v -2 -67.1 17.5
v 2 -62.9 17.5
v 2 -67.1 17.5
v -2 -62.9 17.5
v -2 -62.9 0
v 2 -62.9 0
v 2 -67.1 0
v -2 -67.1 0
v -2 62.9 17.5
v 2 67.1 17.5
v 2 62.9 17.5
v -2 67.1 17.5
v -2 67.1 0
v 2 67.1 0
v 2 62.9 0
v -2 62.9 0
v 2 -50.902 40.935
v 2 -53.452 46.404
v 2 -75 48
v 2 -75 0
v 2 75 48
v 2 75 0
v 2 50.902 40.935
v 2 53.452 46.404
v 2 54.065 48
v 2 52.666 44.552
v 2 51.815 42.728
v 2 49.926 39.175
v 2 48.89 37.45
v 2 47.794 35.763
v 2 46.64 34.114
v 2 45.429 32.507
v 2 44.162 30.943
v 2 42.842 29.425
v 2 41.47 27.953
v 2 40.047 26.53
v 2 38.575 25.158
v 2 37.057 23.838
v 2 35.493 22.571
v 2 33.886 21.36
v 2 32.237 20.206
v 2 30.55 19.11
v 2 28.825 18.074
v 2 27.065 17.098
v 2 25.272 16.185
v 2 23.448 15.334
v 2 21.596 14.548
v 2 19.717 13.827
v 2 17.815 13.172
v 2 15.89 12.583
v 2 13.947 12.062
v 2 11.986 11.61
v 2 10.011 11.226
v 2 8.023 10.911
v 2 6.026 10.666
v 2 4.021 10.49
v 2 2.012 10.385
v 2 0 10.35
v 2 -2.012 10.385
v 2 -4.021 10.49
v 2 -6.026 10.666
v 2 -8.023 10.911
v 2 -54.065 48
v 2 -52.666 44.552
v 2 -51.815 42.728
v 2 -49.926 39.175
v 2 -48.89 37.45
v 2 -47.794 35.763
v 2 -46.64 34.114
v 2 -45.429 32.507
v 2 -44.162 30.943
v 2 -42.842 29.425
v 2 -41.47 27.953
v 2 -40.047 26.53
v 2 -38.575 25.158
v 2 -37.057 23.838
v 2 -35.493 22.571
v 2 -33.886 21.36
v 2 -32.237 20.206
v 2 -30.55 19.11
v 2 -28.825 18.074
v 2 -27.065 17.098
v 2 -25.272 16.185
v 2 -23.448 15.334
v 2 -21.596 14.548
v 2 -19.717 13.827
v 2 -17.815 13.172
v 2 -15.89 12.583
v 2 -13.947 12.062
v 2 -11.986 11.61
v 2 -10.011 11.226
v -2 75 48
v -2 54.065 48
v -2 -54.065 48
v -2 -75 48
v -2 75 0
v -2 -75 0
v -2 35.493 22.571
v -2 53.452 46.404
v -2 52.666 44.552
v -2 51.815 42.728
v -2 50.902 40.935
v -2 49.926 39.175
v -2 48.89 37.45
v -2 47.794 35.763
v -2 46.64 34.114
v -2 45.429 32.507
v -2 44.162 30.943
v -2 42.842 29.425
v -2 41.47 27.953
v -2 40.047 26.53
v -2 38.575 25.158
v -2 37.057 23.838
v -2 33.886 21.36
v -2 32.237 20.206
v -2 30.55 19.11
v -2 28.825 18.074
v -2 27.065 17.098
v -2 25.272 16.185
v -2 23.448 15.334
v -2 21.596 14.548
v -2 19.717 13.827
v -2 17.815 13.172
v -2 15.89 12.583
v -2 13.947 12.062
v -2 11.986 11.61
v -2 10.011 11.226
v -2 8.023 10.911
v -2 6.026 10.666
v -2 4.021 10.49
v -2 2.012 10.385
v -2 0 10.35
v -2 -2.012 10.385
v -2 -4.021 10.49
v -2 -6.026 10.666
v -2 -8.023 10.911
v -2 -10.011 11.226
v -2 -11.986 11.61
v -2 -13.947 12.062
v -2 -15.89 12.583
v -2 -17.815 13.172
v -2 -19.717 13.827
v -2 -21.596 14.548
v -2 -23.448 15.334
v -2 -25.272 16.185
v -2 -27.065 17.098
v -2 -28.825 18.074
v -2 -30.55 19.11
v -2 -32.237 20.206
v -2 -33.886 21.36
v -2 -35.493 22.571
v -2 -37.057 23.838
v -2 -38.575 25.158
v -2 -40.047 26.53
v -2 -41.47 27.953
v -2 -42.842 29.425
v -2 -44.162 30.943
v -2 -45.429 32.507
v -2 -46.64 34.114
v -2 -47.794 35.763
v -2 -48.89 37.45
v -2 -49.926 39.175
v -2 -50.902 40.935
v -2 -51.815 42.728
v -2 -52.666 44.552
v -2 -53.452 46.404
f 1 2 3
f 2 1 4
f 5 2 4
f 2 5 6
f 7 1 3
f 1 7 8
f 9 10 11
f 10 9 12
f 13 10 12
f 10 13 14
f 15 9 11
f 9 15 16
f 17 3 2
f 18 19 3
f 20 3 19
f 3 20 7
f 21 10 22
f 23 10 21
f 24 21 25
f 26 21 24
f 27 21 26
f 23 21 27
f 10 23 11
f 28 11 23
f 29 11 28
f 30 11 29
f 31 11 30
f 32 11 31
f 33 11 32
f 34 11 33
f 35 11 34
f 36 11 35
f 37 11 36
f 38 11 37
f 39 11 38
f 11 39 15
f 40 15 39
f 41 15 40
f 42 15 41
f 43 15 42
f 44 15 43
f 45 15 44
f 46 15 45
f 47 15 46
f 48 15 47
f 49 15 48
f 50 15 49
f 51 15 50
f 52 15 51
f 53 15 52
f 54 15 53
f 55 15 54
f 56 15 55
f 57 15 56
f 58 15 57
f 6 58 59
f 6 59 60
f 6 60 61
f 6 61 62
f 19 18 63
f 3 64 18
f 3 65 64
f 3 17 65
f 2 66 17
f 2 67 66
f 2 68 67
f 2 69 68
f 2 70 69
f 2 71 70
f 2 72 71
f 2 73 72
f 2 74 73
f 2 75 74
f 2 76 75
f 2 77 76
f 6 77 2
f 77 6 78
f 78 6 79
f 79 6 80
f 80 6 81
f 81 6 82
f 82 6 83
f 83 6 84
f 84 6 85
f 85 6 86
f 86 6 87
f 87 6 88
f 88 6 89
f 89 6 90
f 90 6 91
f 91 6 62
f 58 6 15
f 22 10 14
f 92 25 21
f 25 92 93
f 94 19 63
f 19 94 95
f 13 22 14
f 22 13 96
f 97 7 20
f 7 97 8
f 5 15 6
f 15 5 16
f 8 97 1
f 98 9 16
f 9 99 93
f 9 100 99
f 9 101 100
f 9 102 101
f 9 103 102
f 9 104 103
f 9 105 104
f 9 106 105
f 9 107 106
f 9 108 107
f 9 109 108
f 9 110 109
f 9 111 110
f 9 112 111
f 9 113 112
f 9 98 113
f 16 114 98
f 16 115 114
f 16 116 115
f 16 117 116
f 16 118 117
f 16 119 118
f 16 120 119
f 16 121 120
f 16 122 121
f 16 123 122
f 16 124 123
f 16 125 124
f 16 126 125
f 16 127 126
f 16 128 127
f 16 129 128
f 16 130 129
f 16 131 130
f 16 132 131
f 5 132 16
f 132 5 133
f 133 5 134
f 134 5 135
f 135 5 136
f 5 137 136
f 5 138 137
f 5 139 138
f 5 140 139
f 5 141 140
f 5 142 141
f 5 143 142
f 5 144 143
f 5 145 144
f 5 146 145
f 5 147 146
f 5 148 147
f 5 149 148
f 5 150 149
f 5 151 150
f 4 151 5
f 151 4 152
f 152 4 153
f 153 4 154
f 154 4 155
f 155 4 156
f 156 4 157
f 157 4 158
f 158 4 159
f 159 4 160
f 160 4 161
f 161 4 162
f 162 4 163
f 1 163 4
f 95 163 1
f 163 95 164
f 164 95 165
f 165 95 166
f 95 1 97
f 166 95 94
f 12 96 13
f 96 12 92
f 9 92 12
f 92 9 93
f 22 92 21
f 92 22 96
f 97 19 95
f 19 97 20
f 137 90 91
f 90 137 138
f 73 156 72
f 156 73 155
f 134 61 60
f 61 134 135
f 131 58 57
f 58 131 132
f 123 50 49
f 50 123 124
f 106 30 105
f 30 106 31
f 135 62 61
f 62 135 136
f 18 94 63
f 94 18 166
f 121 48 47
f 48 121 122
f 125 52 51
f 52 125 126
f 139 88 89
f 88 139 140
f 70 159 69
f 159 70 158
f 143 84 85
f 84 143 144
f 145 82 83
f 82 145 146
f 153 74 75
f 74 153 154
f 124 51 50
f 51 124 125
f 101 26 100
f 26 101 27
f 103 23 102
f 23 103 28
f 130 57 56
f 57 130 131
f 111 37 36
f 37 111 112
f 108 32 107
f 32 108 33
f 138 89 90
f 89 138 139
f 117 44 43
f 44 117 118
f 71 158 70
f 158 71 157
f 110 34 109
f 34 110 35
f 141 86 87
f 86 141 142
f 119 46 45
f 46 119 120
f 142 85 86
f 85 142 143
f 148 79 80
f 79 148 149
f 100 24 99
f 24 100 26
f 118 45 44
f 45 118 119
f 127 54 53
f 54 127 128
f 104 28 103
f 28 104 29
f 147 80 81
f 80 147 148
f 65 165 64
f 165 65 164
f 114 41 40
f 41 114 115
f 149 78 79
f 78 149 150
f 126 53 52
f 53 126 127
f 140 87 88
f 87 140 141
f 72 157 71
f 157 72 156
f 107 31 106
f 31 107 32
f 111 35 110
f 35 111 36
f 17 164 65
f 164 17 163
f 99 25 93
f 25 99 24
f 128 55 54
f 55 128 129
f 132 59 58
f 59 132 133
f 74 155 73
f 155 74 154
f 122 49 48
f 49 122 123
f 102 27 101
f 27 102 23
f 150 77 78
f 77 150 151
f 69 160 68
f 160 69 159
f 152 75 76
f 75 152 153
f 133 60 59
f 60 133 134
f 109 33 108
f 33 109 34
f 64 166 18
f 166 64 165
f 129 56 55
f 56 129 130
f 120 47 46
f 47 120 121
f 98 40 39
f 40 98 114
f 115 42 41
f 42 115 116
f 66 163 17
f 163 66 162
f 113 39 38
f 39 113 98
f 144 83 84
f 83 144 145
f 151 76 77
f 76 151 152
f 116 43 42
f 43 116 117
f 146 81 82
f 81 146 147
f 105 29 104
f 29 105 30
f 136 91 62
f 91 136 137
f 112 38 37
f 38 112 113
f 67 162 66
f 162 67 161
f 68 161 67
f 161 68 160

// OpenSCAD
// =====================================================================
// wte4_display_stand.scad - WTE4 耐圧容器 展示用 転がり止め台
//
// Blue Robotics WTE4 アクリルチューブ (OD 114.3, 200mm) をフランジ+エンド
// キャップ付きのまま横置きで展示するための台。円筒部だけを 2 枚の受け板で
// 受け、2 本の横桟と十字相欠き (cross-lap) で組む。ねじ・接着なし。
//
//   part="cradle"  受け板  ×2 (YZ 面、円弧受け)
//   part="rail"    横桟    ×2 (XZ 面、受け板をつなぐ)
//   part="asm"     組立状態 (プレビュー用。相欠きのクリアランス 0 で融合)
//   part="demo"    組立状態 + チューブ (PNG プレビュー専用。STL にしない)
//
// 座標系: X = チューブ軸、Y = 幅、Z = 上。原点 = 台の底面中心。
// 印刷向き: どちらの板も平置き (最も広い面を下)。サポート不要。
// 取合い: parts/child/exterior/cots/wte4_acrylic_tube (interfaces.json で固定)
// =====================================================================

/* [部品選択] */
part = "cradle";      // [cradle, rail, asm, demo]

/* [相手部品 (wte4_acrylic_tube)] */
tube_od   = 114.3;    // チューブ外径 (公称 114.3 ± 0.8)
tube_len  = 200;      // チューブ長 (BR-101052-200)
fit_clear = 0.5;      // 半径方向の余裕 (EVA/フェルトを貼るなら厚み分を足す)

/* [板] */
t          = 4;       // 板厚 (全板共通)
slot_clear = 0.2;     // 相欠きスロットの総クリアランス (要フィットテスト)

/* [受け板 (cradle)] */
cr_w      = 150;      // 受け板の幅 (Y)
cr_h      = 48;       // 受け板の高さ (Z)
arc_rise  = 20;       // 円弧中心を板上端からどれだけ上に置くか (大きいほど抱き角が浅い)
cradle_x  = 55;       // 受け板の位置 (中心から ±X)。間隔 = 2*cradle_x

/* [横桟 (rail)] */
rail_len  = 160;      // 横桟の長さ (X)
rail_h    = 35;       // 横桟の高さ (Z)
rail_y    = 65;       // 横桟の位置 (中心から ±Y)

/* [検査] */
min_wall  = 6;        // スロットと縁/円弧の間に残す最小肉
lig_min   = 8;        // 円弧最下部と底面の間に残す最小肉
end_keep  = 10;       // 受け板はチューブ端からこれ以上内側
x1c_max   = 250;      // X1C 実用造形枠

$fn = 180;

// --- 導出値 ------------------------------------------------------------
r_fit    = tube_od/2 + fit_clear;          // 受け円弧の半径
z_c      = cr_h + arc_rise;                // チューブ中心高さ (= 円弧中心)
slot_w   = t + slot_clear;                 // スロット幅
lap      = rail_h/2;                       // 相欠き深さ (横桟の半分)
arc_half = sqrt(r_fit*r_fit - arc_rise*arc_rise);  // 板上端での円弧半幅
wrap_deg = 2*acos(arc_rise/r_fit);         // 抱き角
gap_z    = z_c - r_fit;                    // チューブ最下点と底面の隙間

// --- 干渉・成立チェック ------------------------------------------------
assert(arc_rise >= 0, "arc_rise < 0: 円弧が 180° を超え、チューブを上から入れられない");
assert(gap_z >= lig_min,
       str("円弧最下部の肉が薄すぎる: ", gap_z, " < ", lig_min, " (cr_h か arc_rise を増やす)"));
assert(rail_y - slot_w/2 - arc_half >= min_wall,
       str("横桟スロットが円弧に近すぎる: 肉 ", rail_y - slot_w/2 - arc_half, " < ", min_wall));
assert(cr_w/2 - (rail_y + slot_w/2) >= min_wall,
       str("横桟スロットが受け板の外縁に近すぎる: 肉 ", cr_w/2 - rail_y - slot_w/2, " < ", min_wall));
assert(rail_len/2 - (cradle_x + slot_w/2) >= min_wall,
       str("受け板スロットが横桟の端に近すぎる: 肉 ", rail_len/2 - cradle_x - slot_w/2, " < ", min_wall));
assert(cr_h - lap >= min_wall, "相欠きが受け板の高さに対して深すぎる");
assert(rail_y - slot_w/2 >= tube_od/2,
       "横桟がチューブの真下に入る (rail_y を増やす)");   // 横桟上端はチューブに触れない
assert(cradle_x + t/2 <= tube_len/2 - end_keep,
       str("受け板がチューブ端に近すぎる: ", cradle_x + t/2, " > ", tube_len/2 - end_keep));
assert(max(cr_w, cr_h, rail_len, rail_h) <= x1c_max, "X1C の造形枠を超える");

// --- 部品 --------------------------------------------------------------
module cradle(clear = slot_clear) {
    // YZ 面の板。ローカル座標: X = 板厚方向 (-t/2..t/2), Y 幅, Z 高さ
    sw = t + clear;
    difference() {
        translate([-t/2, -cr_w/2, 0]) cube([t, cr_w, cr_h]);
        // チューブ受け円弧
        translate([0, 0, z_c]) rotate([0, 90, 0])
            cylinder(r = r_fit, h = t + 2, center = true);
        // 横桟用スロット (下から lap まで)
        for (sy = [-rail_y, rail_y])
            translate([-t/2 - 1, sy - sw/2, -1]) cube([t + 2, sw, lap + 1]);
    }
}

module rail(clear = slot_clear) {
    // XZ 面の板。ローカル座標: X 長さ, Y = 板厚方向 (-t/2..t/2), Z 高さ
    sw = t + clear;
    difference() {
        translate([-rail_len/2, -t/2, 0]) cube([rail_len, t, rail_h]);
        // 受け板用スロット (上から lap まで)
        for (sx = [-cradle_x, cradle_x])
            translate([sx - sw/2, -t/2 - 1, lap]) cube([sw, t + 2, rail_h]);
    }
}

module stand(clear = slot_clear) {
    for (x = [-cradle_x, cradle_x]) translate([x, 0, 0]) cradle(clear);
    for (y = [-rail_y, rail_y])     translate([0, y, 0]) rail(clear);
}

module tube_ghost() {
    // 円筒部のみ (フランジ/キャップは省略)
    translate([0, 0, z_c]) rotate([0, 90, 0])
        cylinder(d = tube_od, h = tube_len, center = true);
}

// --- 出力 --------------------------------------------------------------
if (part == "cradle")      cradle();
else if (part == "rail")   rail();
else if (part == "asm")    stand(0);          // 融合させて 1 ソリッドに
else if (part == "demo") {
    color("Orange") stand();
    color("LightSkyBlue", 0.5) tube_ghost();
}

echo(str("wte4_display_stand: r_fit=", r_fit, " z_c=", z_c, " gap_z=", gap_z,
         " wrap=", wrap_deg, "deg arc_half=", arc_half, " slot_w=", slot_w));
